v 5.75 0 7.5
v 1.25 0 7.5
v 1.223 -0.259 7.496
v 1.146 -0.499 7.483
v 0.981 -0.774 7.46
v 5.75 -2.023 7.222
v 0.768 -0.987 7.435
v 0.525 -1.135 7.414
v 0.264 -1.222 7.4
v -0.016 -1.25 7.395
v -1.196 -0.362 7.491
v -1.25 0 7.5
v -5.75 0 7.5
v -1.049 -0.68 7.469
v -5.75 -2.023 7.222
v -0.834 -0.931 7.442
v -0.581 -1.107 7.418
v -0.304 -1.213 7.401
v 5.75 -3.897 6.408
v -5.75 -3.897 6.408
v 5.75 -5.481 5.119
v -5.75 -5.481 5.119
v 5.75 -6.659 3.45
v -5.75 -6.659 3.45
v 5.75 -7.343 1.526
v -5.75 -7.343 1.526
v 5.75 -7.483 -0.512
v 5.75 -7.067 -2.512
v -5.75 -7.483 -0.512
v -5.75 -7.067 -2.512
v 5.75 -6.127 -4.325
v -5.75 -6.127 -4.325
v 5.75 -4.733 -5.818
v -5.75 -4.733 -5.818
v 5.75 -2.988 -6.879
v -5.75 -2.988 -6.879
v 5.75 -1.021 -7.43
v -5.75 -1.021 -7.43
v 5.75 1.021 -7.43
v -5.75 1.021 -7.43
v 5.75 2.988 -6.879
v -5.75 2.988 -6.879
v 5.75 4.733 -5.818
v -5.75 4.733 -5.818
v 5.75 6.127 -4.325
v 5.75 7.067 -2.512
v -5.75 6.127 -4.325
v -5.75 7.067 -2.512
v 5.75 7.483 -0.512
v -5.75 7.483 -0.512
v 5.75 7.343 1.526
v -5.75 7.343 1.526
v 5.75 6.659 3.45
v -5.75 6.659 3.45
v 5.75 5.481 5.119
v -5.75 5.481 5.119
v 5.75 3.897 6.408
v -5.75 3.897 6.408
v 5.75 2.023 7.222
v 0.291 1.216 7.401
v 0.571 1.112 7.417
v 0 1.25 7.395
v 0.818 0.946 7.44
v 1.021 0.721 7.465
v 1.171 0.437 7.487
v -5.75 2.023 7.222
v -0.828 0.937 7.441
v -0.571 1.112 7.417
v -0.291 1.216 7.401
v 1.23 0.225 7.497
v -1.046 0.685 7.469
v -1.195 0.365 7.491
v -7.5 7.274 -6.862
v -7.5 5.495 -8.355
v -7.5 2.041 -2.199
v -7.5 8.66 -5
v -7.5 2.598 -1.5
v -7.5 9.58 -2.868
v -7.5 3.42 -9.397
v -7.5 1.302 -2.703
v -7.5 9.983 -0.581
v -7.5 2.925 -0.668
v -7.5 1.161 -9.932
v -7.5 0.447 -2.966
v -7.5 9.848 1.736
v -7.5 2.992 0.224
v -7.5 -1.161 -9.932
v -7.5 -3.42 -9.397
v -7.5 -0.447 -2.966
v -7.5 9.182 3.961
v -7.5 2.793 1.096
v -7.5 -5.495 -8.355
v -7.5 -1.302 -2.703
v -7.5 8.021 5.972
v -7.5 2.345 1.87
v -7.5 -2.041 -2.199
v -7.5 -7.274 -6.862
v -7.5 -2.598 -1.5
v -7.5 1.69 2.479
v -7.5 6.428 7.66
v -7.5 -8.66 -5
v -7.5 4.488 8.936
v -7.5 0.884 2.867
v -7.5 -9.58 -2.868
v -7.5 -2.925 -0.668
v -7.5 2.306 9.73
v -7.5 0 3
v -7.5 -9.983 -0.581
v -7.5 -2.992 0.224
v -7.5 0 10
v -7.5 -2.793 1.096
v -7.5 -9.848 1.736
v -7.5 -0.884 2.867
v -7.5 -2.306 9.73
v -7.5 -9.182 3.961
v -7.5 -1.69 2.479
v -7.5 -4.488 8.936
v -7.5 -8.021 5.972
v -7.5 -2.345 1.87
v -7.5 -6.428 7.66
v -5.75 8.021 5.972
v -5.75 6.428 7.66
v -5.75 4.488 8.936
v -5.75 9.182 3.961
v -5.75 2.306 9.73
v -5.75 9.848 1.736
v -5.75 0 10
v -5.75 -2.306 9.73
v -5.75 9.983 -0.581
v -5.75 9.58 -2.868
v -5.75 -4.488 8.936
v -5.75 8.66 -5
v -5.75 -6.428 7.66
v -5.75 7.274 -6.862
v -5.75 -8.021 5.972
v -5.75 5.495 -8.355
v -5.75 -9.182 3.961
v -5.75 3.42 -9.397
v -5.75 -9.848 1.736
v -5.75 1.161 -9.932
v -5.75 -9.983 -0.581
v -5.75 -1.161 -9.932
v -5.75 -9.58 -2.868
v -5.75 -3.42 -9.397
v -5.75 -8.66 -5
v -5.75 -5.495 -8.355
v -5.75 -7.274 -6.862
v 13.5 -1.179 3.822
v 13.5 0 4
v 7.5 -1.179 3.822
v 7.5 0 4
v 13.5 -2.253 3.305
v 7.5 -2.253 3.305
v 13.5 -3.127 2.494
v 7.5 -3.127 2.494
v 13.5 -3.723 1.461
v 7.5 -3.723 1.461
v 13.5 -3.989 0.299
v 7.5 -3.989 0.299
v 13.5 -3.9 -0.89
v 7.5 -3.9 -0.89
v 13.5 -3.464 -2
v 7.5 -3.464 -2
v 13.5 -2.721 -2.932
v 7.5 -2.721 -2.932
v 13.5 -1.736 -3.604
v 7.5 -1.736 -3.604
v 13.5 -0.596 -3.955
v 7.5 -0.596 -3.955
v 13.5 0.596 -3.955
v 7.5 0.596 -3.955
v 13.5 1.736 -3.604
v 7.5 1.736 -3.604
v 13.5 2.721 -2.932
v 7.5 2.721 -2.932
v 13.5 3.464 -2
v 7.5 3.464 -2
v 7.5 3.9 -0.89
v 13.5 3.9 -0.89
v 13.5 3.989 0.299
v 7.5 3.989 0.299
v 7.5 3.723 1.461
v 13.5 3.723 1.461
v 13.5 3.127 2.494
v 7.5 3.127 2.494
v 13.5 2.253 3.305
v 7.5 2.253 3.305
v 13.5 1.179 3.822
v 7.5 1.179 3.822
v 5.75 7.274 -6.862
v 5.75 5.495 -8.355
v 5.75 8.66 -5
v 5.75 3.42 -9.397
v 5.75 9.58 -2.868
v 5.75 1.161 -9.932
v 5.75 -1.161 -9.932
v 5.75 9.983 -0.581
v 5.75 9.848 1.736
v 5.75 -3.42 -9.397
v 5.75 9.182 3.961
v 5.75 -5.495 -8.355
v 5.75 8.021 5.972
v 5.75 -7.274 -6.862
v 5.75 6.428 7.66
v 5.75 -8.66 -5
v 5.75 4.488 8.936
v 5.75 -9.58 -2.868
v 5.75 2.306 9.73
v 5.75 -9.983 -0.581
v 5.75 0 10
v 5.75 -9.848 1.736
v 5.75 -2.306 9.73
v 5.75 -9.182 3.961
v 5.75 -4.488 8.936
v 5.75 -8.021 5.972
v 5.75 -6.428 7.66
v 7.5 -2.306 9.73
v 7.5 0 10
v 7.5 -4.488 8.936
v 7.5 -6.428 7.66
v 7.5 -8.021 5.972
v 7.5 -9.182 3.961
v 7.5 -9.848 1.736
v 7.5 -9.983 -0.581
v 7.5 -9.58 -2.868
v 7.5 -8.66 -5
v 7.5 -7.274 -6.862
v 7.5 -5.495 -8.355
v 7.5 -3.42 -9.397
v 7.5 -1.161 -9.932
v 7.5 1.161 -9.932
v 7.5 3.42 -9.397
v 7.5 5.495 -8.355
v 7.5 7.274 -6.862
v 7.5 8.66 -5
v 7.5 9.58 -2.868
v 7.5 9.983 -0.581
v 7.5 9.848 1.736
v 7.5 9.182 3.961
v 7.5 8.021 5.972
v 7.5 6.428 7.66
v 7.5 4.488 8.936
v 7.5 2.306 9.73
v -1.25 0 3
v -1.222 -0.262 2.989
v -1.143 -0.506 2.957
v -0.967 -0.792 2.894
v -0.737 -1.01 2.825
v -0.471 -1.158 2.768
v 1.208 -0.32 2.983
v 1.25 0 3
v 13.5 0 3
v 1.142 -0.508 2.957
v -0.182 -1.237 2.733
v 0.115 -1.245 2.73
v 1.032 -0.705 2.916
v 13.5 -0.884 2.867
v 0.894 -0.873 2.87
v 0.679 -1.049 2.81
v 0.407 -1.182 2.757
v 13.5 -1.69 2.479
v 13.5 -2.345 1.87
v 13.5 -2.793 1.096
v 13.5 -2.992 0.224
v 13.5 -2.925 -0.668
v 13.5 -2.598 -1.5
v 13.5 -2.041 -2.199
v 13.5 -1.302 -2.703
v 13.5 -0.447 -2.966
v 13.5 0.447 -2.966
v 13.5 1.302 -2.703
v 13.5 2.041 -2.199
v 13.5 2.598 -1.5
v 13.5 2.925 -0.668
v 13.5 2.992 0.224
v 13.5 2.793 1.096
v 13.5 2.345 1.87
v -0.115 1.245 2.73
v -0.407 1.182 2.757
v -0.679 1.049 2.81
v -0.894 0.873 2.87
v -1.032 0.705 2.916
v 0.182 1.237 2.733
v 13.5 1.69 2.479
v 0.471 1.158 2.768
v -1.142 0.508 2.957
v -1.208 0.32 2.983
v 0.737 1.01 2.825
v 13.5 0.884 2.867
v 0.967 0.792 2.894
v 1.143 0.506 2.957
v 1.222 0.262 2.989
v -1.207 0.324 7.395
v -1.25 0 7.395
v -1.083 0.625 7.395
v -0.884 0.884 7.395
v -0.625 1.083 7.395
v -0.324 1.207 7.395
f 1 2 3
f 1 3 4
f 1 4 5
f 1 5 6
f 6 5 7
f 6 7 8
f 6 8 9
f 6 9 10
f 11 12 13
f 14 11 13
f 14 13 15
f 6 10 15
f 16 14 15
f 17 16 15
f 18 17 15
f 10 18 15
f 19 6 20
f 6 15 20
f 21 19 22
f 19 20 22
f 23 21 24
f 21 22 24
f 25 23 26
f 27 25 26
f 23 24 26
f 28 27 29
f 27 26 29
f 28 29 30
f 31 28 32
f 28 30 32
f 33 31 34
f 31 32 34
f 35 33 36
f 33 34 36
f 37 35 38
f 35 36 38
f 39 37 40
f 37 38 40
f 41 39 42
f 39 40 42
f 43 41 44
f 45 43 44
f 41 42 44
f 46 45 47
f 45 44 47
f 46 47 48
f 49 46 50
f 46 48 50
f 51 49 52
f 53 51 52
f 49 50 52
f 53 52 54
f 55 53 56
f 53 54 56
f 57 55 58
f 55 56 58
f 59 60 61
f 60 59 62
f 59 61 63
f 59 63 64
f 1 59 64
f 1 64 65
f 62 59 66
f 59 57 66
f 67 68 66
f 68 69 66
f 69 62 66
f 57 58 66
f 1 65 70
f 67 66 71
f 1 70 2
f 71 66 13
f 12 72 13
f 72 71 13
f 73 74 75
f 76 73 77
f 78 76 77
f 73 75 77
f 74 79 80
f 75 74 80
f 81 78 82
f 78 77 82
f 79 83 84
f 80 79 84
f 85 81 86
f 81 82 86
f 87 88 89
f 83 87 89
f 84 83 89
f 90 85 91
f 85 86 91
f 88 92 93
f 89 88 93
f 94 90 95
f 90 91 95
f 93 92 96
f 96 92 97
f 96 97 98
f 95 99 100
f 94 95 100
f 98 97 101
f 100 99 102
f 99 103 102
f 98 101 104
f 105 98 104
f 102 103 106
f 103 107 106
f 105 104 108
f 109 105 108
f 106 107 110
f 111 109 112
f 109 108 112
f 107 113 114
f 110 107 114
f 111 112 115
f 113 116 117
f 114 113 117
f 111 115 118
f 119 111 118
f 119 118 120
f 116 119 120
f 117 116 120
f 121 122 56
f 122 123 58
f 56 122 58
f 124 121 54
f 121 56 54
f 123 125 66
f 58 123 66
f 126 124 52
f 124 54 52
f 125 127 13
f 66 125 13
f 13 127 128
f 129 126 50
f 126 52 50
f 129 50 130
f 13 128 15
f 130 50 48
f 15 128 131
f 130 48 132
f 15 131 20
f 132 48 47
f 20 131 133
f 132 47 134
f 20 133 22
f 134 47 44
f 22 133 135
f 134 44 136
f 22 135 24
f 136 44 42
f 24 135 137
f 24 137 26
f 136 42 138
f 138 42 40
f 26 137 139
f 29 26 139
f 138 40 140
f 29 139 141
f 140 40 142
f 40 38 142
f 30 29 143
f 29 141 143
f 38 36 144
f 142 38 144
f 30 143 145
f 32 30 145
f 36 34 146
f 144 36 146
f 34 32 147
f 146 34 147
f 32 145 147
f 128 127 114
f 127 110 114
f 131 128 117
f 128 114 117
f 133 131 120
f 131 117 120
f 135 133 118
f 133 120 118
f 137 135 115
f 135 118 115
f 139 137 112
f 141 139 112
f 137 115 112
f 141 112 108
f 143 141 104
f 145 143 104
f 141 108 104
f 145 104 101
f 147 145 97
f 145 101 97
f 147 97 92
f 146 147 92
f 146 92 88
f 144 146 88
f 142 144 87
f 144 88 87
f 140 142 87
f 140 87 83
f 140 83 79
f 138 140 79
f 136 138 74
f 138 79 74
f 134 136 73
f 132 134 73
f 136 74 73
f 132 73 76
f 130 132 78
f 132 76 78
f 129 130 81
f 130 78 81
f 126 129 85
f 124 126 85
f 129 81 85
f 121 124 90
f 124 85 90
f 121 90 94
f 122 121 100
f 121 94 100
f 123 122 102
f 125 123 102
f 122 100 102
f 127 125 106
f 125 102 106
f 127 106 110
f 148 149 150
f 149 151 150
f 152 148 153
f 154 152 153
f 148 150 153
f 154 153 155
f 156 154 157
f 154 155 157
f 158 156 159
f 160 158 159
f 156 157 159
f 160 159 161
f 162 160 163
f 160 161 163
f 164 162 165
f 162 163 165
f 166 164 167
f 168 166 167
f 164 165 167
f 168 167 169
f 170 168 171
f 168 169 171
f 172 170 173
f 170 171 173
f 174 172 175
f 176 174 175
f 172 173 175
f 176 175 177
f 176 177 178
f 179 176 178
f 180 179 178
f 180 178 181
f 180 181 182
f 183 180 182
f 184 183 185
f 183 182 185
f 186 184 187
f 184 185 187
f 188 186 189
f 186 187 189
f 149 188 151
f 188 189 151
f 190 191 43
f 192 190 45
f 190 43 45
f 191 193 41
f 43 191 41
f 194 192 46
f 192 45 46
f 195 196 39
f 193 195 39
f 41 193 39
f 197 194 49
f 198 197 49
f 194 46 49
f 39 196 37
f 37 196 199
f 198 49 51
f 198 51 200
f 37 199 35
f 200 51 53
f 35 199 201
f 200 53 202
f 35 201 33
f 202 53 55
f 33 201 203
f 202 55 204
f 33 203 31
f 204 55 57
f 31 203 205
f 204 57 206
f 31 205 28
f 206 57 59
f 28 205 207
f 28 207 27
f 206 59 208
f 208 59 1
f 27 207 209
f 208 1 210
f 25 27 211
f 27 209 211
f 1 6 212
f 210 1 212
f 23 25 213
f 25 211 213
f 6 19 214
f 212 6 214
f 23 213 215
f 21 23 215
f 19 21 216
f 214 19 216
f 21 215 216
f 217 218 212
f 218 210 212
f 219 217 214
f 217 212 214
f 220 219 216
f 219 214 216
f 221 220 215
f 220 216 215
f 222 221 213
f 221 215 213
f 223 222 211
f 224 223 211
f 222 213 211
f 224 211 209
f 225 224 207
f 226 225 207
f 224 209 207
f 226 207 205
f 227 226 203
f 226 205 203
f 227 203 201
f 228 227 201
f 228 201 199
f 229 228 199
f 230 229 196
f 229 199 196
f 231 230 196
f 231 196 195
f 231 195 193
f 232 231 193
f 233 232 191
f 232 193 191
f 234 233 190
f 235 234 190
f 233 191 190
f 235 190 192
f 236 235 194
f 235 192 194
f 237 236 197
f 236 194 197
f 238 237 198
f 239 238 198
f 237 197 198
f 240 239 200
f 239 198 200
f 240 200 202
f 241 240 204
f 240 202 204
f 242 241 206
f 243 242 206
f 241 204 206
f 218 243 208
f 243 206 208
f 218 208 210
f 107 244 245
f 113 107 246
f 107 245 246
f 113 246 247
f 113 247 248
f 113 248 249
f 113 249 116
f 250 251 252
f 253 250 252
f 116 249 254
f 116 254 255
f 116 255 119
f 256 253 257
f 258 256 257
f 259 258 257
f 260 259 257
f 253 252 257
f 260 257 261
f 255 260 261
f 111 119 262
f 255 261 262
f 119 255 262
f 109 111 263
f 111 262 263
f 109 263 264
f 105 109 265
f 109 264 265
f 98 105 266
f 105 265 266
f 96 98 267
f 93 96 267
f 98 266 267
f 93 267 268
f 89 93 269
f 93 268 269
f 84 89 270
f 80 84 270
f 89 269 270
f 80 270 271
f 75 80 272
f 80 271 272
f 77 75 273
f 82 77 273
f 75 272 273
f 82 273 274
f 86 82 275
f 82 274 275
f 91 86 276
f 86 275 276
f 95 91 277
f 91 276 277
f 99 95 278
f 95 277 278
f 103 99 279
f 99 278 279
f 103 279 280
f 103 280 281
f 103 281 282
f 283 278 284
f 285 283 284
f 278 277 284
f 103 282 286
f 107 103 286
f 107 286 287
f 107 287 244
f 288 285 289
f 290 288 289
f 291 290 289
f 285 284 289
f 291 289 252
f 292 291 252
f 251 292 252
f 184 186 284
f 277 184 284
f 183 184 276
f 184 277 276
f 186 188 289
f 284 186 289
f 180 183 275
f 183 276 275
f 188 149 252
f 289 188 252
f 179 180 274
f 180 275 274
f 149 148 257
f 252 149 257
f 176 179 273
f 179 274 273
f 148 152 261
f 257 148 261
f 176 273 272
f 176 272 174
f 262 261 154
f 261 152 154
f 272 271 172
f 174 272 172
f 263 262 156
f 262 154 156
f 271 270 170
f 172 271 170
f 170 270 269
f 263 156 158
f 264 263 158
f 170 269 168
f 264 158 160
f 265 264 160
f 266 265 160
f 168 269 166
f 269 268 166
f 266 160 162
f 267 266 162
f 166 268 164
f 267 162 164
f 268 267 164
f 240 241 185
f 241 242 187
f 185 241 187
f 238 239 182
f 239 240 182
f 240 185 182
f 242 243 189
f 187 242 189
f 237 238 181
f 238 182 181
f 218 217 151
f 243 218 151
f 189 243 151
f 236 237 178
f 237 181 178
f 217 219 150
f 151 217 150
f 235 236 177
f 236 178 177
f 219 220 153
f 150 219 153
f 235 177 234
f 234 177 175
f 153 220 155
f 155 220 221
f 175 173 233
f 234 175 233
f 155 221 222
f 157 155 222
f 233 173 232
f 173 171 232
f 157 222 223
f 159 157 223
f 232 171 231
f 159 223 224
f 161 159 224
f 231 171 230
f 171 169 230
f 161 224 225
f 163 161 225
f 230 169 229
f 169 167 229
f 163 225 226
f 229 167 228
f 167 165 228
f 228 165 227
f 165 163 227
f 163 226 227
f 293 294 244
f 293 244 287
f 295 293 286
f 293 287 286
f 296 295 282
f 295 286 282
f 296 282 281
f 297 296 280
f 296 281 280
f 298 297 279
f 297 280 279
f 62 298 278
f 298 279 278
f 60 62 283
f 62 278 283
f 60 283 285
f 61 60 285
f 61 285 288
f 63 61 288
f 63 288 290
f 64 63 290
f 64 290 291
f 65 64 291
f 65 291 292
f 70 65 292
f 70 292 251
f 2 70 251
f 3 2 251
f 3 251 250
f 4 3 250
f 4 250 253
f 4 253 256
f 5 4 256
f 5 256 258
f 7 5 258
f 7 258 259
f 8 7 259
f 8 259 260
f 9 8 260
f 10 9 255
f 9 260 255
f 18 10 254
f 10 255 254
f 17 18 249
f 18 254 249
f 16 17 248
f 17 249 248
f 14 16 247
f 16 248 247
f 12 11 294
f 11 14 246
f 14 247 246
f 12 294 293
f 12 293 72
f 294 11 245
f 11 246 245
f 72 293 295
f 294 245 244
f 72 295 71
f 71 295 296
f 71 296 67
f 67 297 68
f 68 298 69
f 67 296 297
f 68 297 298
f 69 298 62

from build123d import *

# Parameters (mm, degrees)
F4_D     = 2.5
F4_DEPTH = 8
F4_START = 17.6049004
F4_TIP   = 0.7510757738


with BuildPart() as f1:
    # F0 (on Front) → F1 (revolve)
    with BuildSketch(Plane.XZ):
        Polygon((-7.5, 3), (13.5, 3), (13.5, 4), (7.5, 4), (7.5, 10), (5.75, 10), (5.75, 7.5), (-5.75, 7.5), (-5.75, 10), (-7.5, 10), align=None)
    revolve(axis=Axis((1.1428869498, 0, 0), (1, 0, 0)))

    # F4
    # its depths count from where the whole tool has entered the part; down to there all is cleared
    with Locations(Plane.XY.offset(25)):
        with Locations((0, 0)):
            Hole(F4_D / 2, depth=F4_START)
    with Locations(Plane.XY.offset(25).offset(-F4_START)):
        with Locations((0, 0)):
            Hole(F4_D / 2, depth=F4_DEPTH)
            with Locations((0, 0, -(F4_DEPTH + F4_TIP / 2))):  # 118° drill point
                Cone(0, F4_D / 2, F4_TIP, mode=Mode.SUBTRACT)


solid = f1.part
